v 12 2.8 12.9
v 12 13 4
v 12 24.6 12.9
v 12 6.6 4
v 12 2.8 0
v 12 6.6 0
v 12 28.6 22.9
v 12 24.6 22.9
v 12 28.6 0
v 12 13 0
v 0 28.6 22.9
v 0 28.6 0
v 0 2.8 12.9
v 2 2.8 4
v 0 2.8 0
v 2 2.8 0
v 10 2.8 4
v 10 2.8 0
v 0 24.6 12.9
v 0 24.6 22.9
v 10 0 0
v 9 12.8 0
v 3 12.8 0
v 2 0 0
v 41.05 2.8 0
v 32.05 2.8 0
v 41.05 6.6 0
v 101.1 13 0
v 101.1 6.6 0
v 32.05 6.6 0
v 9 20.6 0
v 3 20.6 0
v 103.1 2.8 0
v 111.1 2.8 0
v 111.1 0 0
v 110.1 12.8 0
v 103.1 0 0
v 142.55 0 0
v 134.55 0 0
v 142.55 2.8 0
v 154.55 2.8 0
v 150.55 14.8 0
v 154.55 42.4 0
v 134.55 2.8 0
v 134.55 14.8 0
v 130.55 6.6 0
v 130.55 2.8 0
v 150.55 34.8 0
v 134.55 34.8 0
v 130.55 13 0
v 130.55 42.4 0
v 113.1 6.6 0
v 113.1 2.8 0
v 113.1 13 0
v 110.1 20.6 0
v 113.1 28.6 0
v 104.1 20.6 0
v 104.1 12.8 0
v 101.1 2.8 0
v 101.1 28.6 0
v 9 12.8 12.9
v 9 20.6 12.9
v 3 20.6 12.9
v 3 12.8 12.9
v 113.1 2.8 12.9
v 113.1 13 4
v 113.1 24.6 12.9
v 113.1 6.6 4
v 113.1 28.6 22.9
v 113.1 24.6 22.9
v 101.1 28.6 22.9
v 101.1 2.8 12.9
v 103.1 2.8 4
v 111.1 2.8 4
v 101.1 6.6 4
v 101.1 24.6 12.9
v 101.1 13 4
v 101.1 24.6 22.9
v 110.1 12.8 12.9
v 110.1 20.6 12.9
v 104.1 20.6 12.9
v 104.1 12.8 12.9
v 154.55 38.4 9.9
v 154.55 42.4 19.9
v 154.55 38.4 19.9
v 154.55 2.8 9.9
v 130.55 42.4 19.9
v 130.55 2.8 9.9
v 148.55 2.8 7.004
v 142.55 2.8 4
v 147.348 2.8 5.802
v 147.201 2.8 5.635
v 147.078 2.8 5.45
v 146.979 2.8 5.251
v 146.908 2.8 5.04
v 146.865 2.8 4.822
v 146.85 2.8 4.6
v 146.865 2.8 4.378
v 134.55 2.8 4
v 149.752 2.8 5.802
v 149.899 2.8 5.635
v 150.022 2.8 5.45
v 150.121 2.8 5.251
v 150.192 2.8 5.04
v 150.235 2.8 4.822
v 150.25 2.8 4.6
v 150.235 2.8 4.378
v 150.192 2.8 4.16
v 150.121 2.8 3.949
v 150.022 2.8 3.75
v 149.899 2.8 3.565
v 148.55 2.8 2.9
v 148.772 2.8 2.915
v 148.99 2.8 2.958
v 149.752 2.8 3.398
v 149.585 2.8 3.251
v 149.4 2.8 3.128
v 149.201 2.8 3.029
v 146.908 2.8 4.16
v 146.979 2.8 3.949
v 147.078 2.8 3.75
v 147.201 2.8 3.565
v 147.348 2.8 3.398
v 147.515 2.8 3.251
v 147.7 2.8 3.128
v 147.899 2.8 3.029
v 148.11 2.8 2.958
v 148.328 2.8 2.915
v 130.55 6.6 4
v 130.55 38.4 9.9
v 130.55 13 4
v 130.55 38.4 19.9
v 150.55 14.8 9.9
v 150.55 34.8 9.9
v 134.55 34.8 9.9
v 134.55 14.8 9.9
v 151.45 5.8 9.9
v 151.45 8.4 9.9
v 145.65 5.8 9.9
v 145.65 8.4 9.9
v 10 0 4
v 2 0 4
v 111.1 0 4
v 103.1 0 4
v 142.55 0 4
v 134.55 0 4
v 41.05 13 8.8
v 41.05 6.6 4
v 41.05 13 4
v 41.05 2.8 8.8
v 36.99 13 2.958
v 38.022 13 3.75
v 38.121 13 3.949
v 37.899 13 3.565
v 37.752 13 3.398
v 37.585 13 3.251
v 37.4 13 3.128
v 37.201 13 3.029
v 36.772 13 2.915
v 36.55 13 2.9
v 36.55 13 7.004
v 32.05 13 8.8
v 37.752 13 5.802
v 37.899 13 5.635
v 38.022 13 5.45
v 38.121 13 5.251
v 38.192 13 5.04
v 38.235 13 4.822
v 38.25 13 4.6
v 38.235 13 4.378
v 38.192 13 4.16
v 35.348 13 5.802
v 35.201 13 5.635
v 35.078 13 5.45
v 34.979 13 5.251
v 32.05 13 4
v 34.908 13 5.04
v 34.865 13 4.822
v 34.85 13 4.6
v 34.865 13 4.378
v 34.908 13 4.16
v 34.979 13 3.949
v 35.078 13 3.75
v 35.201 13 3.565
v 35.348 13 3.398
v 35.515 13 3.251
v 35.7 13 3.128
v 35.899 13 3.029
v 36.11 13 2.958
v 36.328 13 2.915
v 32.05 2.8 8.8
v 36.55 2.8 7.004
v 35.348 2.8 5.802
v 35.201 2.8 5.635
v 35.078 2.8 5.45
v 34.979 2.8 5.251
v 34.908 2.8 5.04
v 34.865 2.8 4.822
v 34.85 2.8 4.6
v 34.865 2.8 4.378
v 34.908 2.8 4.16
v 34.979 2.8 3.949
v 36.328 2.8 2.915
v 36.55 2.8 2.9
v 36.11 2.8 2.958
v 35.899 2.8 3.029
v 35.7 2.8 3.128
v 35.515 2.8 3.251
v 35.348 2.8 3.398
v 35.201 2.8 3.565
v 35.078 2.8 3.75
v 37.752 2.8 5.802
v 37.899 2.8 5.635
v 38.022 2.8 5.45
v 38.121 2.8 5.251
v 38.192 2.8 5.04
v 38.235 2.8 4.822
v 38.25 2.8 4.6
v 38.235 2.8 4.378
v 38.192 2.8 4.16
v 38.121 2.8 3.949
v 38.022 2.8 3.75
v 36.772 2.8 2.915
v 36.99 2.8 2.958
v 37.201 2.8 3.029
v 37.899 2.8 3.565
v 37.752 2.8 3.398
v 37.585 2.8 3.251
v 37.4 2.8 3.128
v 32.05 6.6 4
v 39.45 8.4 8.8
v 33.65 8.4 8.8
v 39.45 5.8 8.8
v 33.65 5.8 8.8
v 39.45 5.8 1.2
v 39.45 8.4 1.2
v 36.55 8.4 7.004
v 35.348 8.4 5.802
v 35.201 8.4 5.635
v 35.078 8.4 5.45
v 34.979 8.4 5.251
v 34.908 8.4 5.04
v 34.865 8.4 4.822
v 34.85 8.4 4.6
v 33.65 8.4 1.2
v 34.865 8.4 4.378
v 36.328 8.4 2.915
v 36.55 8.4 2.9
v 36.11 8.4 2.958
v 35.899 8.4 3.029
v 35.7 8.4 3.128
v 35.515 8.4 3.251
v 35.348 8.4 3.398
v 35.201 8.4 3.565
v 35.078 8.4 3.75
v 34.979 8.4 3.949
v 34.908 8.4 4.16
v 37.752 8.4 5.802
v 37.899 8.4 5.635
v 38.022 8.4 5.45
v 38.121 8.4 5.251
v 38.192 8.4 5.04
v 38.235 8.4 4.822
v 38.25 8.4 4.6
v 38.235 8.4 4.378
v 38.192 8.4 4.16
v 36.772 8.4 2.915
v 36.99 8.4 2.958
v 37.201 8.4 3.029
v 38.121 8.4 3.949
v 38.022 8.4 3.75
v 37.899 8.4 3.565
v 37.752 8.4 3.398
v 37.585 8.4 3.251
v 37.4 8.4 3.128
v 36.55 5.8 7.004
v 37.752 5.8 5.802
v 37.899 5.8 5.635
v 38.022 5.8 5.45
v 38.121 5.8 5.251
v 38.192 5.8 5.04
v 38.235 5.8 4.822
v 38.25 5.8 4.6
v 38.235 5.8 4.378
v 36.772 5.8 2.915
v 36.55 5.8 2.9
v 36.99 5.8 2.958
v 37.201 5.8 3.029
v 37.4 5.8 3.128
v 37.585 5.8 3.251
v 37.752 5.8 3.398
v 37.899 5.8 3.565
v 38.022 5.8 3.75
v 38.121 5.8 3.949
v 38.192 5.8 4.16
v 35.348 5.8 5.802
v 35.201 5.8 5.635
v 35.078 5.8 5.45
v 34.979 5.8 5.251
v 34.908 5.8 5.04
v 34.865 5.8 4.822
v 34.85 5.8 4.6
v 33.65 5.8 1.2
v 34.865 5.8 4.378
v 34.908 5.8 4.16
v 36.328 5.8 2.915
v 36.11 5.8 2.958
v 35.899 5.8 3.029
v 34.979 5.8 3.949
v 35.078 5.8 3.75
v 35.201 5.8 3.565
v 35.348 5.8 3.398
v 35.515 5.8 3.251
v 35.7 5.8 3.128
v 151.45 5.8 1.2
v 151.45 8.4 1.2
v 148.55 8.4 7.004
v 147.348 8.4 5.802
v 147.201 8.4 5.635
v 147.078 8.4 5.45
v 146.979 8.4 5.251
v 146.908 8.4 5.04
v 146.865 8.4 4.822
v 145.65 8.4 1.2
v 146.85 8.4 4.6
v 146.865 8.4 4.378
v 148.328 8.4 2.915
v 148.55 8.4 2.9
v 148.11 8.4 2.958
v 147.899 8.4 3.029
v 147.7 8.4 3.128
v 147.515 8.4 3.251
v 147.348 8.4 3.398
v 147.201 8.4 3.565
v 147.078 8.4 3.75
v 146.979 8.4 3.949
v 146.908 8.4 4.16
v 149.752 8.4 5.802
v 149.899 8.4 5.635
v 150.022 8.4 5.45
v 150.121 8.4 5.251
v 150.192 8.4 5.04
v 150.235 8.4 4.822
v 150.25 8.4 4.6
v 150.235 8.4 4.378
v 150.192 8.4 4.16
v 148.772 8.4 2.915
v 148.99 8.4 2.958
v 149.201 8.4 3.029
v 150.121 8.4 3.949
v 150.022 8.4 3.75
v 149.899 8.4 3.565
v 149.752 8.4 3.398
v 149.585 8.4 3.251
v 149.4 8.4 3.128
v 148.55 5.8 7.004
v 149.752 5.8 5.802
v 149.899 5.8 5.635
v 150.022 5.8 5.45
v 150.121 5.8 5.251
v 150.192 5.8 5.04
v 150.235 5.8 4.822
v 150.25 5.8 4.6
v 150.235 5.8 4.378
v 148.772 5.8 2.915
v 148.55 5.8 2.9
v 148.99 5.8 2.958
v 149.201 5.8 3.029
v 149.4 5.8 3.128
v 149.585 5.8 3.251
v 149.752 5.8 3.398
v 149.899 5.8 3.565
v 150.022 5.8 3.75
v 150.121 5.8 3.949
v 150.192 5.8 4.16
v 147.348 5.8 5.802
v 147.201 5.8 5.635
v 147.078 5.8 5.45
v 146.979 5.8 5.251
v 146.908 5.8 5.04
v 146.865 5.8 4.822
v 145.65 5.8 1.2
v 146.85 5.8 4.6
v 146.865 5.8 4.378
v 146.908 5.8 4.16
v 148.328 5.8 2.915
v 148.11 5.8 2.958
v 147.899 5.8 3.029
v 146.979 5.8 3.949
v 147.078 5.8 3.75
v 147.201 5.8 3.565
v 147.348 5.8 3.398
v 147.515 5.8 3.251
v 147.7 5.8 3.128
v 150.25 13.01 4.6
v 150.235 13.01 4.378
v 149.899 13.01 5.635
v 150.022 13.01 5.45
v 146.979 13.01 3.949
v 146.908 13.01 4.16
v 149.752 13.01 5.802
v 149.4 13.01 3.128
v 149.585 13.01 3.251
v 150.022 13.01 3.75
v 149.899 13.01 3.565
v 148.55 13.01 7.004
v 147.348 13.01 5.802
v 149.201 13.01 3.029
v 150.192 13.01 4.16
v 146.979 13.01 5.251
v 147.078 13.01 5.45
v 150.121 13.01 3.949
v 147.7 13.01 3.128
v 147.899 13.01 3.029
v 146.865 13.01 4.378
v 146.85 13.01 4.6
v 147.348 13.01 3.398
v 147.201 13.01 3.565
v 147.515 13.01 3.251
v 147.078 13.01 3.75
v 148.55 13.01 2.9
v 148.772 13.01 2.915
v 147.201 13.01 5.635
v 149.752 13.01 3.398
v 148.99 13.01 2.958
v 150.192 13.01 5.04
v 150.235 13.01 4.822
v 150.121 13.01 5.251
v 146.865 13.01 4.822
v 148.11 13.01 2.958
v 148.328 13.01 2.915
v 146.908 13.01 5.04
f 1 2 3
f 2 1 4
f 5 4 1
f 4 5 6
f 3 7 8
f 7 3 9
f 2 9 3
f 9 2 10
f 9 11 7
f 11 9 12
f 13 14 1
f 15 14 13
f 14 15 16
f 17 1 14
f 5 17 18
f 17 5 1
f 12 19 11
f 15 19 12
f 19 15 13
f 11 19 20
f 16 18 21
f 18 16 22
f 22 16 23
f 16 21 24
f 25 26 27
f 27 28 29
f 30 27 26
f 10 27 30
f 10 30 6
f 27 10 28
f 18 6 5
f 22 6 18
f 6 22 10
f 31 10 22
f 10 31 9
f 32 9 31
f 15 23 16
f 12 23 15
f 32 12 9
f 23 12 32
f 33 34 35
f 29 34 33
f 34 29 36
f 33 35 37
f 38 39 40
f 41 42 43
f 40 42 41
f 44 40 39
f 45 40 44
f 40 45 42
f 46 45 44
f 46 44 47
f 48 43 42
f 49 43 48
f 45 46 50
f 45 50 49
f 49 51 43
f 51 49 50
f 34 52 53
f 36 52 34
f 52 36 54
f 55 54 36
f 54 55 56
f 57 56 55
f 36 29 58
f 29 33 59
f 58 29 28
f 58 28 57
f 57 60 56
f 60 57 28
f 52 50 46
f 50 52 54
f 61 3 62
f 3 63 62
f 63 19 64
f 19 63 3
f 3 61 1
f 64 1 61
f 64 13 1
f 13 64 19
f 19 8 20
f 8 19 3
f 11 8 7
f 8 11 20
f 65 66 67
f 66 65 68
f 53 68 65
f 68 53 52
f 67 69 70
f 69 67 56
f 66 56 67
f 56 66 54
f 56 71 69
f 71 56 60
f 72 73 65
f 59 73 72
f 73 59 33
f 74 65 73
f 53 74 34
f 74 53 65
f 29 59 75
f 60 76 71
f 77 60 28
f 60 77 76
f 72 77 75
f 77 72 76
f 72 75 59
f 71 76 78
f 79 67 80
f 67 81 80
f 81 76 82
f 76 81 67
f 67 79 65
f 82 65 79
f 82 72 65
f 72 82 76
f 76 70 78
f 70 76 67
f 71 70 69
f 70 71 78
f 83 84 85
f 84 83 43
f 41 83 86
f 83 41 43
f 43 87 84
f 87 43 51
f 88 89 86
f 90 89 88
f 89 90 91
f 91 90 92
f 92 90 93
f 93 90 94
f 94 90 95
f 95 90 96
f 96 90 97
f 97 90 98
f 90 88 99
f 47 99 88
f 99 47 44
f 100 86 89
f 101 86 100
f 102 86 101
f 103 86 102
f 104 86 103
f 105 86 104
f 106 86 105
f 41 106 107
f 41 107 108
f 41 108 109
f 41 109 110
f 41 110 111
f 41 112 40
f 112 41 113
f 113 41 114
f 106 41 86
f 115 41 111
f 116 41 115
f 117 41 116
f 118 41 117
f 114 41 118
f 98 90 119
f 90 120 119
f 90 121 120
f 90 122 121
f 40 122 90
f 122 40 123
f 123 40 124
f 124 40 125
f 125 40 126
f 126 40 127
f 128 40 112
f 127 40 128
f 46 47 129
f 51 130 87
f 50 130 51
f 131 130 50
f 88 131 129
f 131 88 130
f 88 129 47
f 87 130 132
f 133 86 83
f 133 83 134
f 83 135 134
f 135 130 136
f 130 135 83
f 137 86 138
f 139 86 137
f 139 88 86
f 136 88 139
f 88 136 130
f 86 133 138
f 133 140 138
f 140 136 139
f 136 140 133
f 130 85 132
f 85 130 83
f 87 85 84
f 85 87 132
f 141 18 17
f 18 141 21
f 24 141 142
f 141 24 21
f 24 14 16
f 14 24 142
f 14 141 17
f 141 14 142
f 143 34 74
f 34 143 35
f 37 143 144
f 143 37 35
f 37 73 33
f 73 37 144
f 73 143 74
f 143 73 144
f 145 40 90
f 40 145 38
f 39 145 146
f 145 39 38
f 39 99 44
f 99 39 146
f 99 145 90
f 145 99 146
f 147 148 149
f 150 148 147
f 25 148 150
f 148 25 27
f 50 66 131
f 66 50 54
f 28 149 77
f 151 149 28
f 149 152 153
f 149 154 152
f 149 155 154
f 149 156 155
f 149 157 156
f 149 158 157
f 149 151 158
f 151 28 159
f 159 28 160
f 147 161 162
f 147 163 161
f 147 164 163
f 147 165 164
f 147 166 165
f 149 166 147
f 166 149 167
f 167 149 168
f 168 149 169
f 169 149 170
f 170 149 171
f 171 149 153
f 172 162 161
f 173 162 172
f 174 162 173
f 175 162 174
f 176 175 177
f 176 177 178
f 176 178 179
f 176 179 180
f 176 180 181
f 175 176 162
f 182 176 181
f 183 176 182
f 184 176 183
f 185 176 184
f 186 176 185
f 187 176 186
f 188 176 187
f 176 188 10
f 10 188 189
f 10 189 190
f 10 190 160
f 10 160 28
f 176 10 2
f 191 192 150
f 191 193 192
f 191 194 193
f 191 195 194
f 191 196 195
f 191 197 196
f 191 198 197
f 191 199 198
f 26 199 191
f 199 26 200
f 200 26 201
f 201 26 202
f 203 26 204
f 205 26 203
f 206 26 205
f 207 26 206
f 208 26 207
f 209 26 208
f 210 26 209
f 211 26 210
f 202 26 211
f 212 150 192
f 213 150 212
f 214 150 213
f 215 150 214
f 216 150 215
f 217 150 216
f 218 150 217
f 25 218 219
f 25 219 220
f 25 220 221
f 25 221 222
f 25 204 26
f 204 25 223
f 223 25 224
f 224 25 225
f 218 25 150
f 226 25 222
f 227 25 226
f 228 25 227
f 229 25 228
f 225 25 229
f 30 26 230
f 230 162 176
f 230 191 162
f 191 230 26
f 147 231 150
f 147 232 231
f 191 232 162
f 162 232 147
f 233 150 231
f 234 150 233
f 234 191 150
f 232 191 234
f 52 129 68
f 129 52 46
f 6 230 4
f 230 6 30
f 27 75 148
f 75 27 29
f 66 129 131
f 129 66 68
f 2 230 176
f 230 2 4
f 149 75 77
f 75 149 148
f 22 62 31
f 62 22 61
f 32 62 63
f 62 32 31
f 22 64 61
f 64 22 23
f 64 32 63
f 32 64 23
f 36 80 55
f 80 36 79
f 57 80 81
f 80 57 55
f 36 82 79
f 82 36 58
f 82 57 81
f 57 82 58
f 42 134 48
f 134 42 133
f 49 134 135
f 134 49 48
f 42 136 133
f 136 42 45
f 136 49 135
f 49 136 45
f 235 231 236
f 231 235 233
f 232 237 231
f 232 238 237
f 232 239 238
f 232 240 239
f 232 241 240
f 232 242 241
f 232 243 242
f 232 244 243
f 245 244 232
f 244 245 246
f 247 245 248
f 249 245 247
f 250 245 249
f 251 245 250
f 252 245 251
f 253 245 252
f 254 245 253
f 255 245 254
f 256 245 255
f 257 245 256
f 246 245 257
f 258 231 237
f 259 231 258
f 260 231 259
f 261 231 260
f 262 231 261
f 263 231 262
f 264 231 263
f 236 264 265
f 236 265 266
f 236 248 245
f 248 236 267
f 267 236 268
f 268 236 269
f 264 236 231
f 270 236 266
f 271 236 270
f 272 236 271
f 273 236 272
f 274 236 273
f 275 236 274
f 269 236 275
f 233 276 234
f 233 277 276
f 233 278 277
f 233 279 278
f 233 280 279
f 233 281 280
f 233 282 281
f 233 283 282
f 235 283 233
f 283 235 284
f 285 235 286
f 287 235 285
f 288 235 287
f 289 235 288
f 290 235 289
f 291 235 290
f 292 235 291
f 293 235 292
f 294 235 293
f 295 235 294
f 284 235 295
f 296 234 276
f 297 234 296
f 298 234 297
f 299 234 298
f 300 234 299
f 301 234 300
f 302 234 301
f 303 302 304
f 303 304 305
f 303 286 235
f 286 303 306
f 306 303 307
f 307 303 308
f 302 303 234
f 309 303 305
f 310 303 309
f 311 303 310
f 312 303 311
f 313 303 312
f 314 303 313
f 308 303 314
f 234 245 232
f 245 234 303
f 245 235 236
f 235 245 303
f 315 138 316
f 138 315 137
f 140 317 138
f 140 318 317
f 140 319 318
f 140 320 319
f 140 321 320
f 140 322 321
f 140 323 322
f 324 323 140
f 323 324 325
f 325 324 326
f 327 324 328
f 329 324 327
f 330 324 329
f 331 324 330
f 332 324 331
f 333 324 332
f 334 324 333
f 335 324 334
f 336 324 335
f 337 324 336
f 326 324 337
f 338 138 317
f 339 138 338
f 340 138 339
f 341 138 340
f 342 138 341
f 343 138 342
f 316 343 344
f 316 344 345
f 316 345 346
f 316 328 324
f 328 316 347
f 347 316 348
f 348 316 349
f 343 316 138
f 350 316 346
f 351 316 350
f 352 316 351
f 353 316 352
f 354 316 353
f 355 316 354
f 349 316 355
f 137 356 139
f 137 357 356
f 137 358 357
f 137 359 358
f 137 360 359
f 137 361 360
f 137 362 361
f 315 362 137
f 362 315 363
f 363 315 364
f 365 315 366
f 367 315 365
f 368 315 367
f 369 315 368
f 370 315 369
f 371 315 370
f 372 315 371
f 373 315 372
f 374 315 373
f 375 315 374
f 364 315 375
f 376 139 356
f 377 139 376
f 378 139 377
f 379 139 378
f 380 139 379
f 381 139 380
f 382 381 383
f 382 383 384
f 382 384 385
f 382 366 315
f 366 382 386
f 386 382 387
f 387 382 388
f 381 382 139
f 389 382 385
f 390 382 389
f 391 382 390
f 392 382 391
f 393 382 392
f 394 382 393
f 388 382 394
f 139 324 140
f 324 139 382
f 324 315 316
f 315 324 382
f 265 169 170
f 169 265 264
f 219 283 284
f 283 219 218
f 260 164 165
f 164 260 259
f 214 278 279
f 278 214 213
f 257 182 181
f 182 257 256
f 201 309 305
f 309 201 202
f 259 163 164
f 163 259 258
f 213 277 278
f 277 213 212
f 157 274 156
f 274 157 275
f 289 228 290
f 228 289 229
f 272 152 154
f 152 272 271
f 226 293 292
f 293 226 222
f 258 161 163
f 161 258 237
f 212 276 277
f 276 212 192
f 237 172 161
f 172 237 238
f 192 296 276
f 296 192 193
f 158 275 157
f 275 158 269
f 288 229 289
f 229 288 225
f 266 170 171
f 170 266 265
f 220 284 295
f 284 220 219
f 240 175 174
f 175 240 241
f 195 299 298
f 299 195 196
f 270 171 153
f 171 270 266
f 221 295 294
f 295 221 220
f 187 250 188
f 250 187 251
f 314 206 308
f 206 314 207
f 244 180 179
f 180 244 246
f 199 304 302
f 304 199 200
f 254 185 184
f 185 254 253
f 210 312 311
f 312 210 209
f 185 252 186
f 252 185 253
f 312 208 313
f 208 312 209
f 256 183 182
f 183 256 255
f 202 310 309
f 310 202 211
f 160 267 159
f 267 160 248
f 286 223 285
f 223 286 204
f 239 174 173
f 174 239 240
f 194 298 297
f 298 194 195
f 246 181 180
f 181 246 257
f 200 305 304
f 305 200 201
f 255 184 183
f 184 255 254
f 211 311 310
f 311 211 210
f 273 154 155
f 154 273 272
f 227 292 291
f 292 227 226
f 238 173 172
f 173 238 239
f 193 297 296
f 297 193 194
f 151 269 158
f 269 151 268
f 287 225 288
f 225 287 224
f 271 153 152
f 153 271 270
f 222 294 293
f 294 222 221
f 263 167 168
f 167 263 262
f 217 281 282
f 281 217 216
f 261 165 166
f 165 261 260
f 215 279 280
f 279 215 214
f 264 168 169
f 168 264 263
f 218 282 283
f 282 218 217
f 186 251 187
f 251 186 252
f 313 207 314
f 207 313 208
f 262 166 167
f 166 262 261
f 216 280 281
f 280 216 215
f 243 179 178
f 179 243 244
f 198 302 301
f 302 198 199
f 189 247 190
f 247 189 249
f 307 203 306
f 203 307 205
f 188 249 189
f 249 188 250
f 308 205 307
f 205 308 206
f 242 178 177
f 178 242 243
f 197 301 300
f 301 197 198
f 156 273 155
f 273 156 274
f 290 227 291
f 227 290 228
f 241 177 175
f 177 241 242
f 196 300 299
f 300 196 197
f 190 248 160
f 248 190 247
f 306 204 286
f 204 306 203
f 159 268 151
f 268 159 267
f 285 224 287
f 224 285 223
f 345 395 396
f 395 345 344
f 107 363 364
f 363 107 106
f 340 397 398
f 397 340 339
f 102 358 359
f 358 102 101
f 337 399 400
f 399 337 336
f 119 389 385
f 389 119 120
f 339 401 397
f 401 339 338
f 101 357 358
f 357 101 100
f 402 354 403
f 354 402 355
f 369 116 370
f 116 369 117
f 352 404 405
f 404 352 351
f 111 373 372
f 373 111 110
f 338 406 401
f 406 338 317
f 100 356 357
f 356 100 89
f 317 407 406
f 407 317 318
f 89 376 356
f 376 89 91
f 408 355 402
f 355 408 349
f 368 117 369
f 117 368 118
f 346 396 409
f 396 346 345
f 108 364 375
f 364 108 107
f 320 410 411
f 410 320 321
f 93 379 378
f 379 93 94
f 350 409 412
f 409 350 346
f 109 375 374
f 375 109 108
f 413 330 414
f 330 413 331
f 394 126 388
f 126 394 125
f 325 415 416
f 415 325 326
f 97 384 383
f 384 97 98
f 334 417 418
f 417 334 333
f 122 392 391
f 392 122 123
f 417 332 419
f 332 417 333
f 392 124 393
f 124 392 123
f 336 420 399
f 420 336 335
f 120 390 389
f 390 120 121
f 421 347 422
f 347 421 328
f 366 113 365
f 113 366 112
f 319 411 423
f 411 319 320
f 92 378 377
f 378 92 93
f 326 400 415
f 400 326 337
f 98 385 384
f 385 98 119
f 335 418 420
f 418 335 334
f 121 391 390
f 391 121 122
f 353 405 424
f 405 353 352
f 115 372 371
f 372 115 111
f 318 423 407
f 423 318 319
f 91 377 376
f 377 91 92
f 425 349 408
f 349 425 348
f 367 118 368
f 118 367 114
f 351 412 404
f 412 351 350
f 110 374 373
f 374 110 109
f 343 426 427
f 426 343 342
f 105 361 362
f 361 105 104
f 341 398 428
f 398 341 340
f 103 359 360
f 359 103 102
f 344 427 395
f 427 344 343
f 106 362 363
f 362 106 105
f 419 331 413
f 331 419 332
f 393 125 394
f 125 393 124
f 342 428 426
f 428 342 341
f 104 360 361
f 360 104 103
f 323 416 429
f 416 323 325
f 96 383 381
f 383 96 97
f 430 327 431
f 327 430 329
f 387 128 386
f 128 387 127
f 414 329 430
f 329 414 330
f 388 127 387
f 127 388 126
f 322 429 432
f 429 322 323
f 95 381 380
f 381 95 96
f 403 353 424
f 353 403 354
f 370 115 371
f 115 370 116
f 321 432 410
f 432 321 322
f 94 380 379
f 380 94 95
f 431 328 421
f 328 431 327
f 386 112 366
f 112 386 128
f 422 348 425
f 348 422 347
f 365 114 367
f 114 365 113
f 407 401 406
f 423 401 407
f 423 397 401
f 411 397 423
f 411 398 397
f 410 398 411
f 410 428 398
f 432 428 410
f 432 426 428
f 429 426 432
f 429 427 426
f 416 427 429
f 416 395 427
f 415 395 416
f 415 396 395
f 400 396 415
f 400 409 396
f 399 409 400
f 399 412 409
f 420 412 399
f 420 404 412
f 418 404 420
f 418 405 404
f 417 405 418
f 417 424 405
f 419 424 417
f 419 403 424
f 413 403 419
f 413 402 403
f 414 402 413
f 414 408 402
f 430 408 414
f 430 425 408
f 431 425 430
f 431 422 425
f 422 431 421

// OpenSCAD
/*
 * V4 keyed rear retaining frame — Flex Mini 2.5G + U-PoE-AT rack mount.
 * Units: millimeters. Installed axes: X across, Y rearward, Z upward.
 * Use ONLY with the matching V4 slotted base; this is not a V3 drop-in part.
 *
 * PRINT: default output places the common rear face on the print bed.
 * Nominal print bounds: 154.55 X x 42.4 Y x 22.9 Z mm.
 * All retaining fingers grow from that rear face. No separate rear feet or
 * external joining lip are present. Export one copy of this entire frame.
 *
 * ASSEMBLY: insert two standard M3 nuts into the frame's front-loading slots.
 * Slide both devices against the front bezel and lower the frame's three
 * locating tabs into the matching tray slots. Install two M3 x 10, 90-degree
 * countersunk screws from underneath the matching V4 base into the nuts.
 * The flush screw heads preserve the rack height. Do not substitute a loose
 * friction fit for the screws: they lock the frame against lifting. The tabs
 * locate the frame and resist sideways movement. Underside access is needed.
 *
 * The switch stop is 3 mm forward of the injector stop, accounting for their
 * nominal 90 mm and 93 mm depths. Their top retaining surfaces differ by
 * 13.8 mm, accounting for their nominal 21.2 mm and 35 mm body heights.
 * Clearance behind and above each nominal case is 0.6 mm. The injector's
 * retainer remains on its left rear edge to leave the right rear IEC socket
 * region open. Check the actual case, connector and cable boot clearances.
 *
 * PROTOTYPE: nominal dimensions and geometry have not been physically tested.
 * This revision simplifies print orientation; it does not guarantee a lower
 * service quote. Use a fit check before ordering a final service print.
 */

/* [Output] */
print_orientation = true;

/* [Nominal device envelopes — synchronized with the V4 base] */
switch_size = [117.1, 90, 21.2];
switch_position = [29.45, 4.8, 4];
injector_size = [62, 93, 35];
injector_position = [162, 4.8, 4];
case_clearance = 0.6;

/* [Frame] */
rear_plane = 108.3;
upright_bottom = 4;
roof_thickness = 4;
roof_forward_overlap = 10;
switch_upright_x = [31.45, 132.55];
switch_upright_width = 12;
injector_upright_x = 162;
injector_upright_width = 24;
crossmember_front = 104.3;
crossmember_bottom = 7.8;
crossmember_top = 14.2;

/* [Locating tabs] */
tab_centers_x = [37.45, 138.55, 170];
tab_width = 8;
tab_front = 104.3;
tab_bottom = 1.2;
tab_top = 4.4;

/* [Two underside-access M3 locks] */
lock_centers_x = [68, 180];
lock_y = 103.7;
lock_diameter = 3.4;
lock_boss_width = 9;
lock_boss_front = 99.5;
lock_boss_bottom = 4;
lock_boss_top = 14.2;
nut_slot_width = 5.8; // Across X; captures nominal 5.5 mm nut flats
nut_slot_front = 97.9; // Opens through the injector upright's Y98.4 front
nut_slot_rear = 107.1; // Leaves a 1.2 mm wall at the common rear face
nut_slot_bottom = 7;
nut_slot_top = 9.6;

/* [Hidden] */
$fn = 48;
epsilon = 0.01;
frame_left = switch_upright_x[0];
frame_right = injector_upright_x + injector_upright_width;
switch_stop_y = switch_position[1] + switch_size[1] + case_clearance;
injector_stop_y = injector_position[1] + injector_size[1] + case_clearance;
switch_roof_bottom = switch_position[2] + switch_size[2] + case_clearance;
injector_roof_bottom = injector_position[2] + injector_size[2] + case_clearance;
switch_roof_top = switch_roof_bottom + roof_thickness;
injector_roof_top = injector_roof_bottom + roof_thickness;
frontmost_y = min(switch_stop_y, injector_stop_y) - roof_forward_overlap;
switch_window_x_inset = 3;
switch_window_bottom = 14;
switch_window_top = 21.8;
injector_window_x_inset = 4;
injector_window_bottom = 16;
injector_window_top = 36;

assert(case_clearance > 0 && roof_thickness > 0 &&
       roof_forward_overlap > case_clearance,
       "Positive clearance and positive roof overlap are required.");
assert(switch_stop_y < injector_stop_y && injector_stop_y < rear_plane &&
       switch_roof_bottom < injector_roof_bottom && injector_roof_top <= 44,
       "Both stop depths and capture heights must fit inside 1U.");
assert(crossmember_front < rear_plane && crossmember_bottom < crossmember_top &&
       crossmember_bottom >= upright_bottom &&
       crossmember_top < switch_roof_bottom,
       "The lower connecting member must remain below the capture roofs.");
assert(tab_width > 0 && tab_front < rear_plane &&
       tab_bottom >= 0 && tab_bottom < upright_bottom && tab_top > upright_bottom,
       "Locating tabs must extend into the tray and overlap the uprights.");
assert(switch_window_x_inset > 0 &&
       2*switch_window_x_inset < switch_upright_width &&
       switch_window_bottom > upright_bottom &&
       switch_window_top < switch_roof_bottom &&
       injector_window_x_inset > 0 &&
       2*injector_window_x_inset < injector_upright_width &&
       injector_window_bottom > upright_bottom &&
       injector_window_top < injector_roof_bottom,
       "Lightening windows must preserve solid frame edges.");
assert(lock_diameter > 0 &&
       lock_boss_front < crossmember_front && lock_boss_front < lock_y &&
       lock_y-lock_diameter/sqrt(2) > lock_boss_front &&
       lock_y+lock_diameter/2 < rear_plane &&
       lock_boss_bottom == upright_bottom && lock_boss_top >= crossmember_top,
       "Vertical lock holes and their teardrop tips must fit the bosses.");
assert(nut_slot_width > 5.5 && nut_slot_width < 5.5/cos(30) &&
       nut_slot_width < lock_boss_width &&
       nut_slot_front < min(lock_boss_front, injector_stop_y) &&
       nut_slot_rear < rear_plane &&
       nut_slot_bottom > lock_boss_bottom &&
       nut_slot_top < lock_boss_top && nut_slot_top-nut_slot_bottom >= 2.4 &&
       lock_y+5.5/sqrt(3) < nut_slot_rear &&
       lock_y-5.5/sqrt(3) > lock_boss_front,
       "Front-loading nut slots must fit standard M3 nuts and retain their flats.");
for (x = lock_centers_x)
    assert(x-lock_boss_width/2 > frame_left &&
           x+lock_boss_width/2 < frame_right,
           "Lock bosses must stay within the frame span.");
for (i = [0:2]) {
    u_x = i < 2 ? switch_upright_x[i] : injector_upright_x;
    u_width = i < 2 ? switch_upright_width : injector_upright_width;
    assert(tab_centers_x[i]-tab_width/2 >= u_x &&
           tab_centers_x[i]+tab_width/2 <= u_x+u_width,
           "Each locating tab must be attached beneath an upright.");
}

module upright(x, width, stop_y, roof_bottom) {
    // Both prisms terminate at the common rear printing plane.
    translate([x, stop_y, upright_bottom])
        cube([width, rear_plane-stop_y,
              roof_bottom+roof_thickness-upright_bottom]);
    translate([x, stop_y-roof_forward_overlap, roof_bottom])
        cube([width, rear_plane-stop_y+roof_forward_overlap, roof_thickness]);
}

module frame_blank() {
    union() {
        for (x = switch_upright_x)
            upright(x, switch_upright_width, switch_stop_y, switch_roof_bottom);
        upright(injector_upright_x, injector_upright_width,
                injector_stop_y, injector_roof_bottom);
        translate([frame_left, crossmember_front, crossmember_bottom])
            cube([frame_right-frame_left, rear_plane-crossmember_front,
                  crossmember_top-crossmember_bottom]);
        for (x = tab_centers_x)
            translate([x-tab_width/2, tab_front, tab_bottom])
                cube([tab_width, rear_plane-tab_front, tab_top-tab_bottom]);
        for (x = lock_centers_x)
            translate([x-lock_boss_width/2, lock_boss_front, lock_boss_bottom])
                cube([lock_boss_width, rear_plane-lock_boss_front,
                      lock_boss_top-lock_boss_bottom]);
    }
}

module lightening_windows() {
    for (x = switch_upright_x)
        translate([x+switch_window_x_inset, frontmost_y-epsilon,
                   switch_window_bottom])
            cube([switch_upright_width-2*switch_window_x_inset,
                  rear_plane-frontmost_y+2*epsilon,
                  switch_window_top-switch_window_bottom]);
    translate([injector_upright_x+injector_window_x_inset,
               frontmost_y-epsilon, injector_window_bottom])
        cube([injector_upright_width-2*injector_window_x_inset,
              rear_plane-frontmost_y+2*epsilon,
              injector_window_top-injector_window_bottom]);
}

module nut_slots() {
    for (x = lock_centers_x)
        translate([x-nut_slot_width/2, nut_slot_front, nut_slot_bottom])
            cube([nut_slot_width, nut_slot_rear-nut_slot_front,
                  nut_slot_top-nut_slot_bottom]);
}

// The circular screw clearance has a 45-degree apex toward the front (-Y).
// This points upward in the rear-face-down print orientation.
module front_pointing_teardrop(diameter) {
    radius = diameter/2;
    tangent = radius/sqrt(2);
    union() {
        circle(r=radius);
        polygon([[-tangent, -tangent], [tangent, -tangent],
                 [0, -radius*sqrt(2)]]);
    }
}

module lock_holes() {
    for (x = lock_centers_x)
        translate([x, lock_y, lock_boss_bottom-epsilon])
            linear_extrude(height=lock_boss_top-lock_boss_bottom+2*epsilon)
                front_pointing_teardrop(lock_diameter);
}

module retaining_frame() {
    difference() {
        frame_blank();
        lightening_windows();
        nut_slots();
        lock_holes();
    }
}

/*
 * PRINTABILITY INVARIANT
 * Before subtraction, every occupied XZ column is a single Y interval ending
 * at rear_plane. Lightening windows remove whole columns. The front-loading
 * nut slots trim the forward ends of columns, leaving their roofs supported
 * from the common rear printing face. Roof fingers and tabs have a direct
 * path to the print bed, without a suspended start.
 *
 * The vertical screw holes are horizontal during printing. Their forward
 * teardrop apex closes at 45 degrees, avoiding a flat bridge across each bore.
 * These bores mean the complete layer footprints are not strictly nested;
 * their small closing walls use the 45-degree slope instead. This geometric
 * assessment does not substitute for a slicer/process review or a fit test.
 */
if (print_orientation)
    translate([-frame_left, -tab_bottom, rear_plane])
        rotate([-90, 0, 0]) retaining_frame();
else
    retaining_frame();
